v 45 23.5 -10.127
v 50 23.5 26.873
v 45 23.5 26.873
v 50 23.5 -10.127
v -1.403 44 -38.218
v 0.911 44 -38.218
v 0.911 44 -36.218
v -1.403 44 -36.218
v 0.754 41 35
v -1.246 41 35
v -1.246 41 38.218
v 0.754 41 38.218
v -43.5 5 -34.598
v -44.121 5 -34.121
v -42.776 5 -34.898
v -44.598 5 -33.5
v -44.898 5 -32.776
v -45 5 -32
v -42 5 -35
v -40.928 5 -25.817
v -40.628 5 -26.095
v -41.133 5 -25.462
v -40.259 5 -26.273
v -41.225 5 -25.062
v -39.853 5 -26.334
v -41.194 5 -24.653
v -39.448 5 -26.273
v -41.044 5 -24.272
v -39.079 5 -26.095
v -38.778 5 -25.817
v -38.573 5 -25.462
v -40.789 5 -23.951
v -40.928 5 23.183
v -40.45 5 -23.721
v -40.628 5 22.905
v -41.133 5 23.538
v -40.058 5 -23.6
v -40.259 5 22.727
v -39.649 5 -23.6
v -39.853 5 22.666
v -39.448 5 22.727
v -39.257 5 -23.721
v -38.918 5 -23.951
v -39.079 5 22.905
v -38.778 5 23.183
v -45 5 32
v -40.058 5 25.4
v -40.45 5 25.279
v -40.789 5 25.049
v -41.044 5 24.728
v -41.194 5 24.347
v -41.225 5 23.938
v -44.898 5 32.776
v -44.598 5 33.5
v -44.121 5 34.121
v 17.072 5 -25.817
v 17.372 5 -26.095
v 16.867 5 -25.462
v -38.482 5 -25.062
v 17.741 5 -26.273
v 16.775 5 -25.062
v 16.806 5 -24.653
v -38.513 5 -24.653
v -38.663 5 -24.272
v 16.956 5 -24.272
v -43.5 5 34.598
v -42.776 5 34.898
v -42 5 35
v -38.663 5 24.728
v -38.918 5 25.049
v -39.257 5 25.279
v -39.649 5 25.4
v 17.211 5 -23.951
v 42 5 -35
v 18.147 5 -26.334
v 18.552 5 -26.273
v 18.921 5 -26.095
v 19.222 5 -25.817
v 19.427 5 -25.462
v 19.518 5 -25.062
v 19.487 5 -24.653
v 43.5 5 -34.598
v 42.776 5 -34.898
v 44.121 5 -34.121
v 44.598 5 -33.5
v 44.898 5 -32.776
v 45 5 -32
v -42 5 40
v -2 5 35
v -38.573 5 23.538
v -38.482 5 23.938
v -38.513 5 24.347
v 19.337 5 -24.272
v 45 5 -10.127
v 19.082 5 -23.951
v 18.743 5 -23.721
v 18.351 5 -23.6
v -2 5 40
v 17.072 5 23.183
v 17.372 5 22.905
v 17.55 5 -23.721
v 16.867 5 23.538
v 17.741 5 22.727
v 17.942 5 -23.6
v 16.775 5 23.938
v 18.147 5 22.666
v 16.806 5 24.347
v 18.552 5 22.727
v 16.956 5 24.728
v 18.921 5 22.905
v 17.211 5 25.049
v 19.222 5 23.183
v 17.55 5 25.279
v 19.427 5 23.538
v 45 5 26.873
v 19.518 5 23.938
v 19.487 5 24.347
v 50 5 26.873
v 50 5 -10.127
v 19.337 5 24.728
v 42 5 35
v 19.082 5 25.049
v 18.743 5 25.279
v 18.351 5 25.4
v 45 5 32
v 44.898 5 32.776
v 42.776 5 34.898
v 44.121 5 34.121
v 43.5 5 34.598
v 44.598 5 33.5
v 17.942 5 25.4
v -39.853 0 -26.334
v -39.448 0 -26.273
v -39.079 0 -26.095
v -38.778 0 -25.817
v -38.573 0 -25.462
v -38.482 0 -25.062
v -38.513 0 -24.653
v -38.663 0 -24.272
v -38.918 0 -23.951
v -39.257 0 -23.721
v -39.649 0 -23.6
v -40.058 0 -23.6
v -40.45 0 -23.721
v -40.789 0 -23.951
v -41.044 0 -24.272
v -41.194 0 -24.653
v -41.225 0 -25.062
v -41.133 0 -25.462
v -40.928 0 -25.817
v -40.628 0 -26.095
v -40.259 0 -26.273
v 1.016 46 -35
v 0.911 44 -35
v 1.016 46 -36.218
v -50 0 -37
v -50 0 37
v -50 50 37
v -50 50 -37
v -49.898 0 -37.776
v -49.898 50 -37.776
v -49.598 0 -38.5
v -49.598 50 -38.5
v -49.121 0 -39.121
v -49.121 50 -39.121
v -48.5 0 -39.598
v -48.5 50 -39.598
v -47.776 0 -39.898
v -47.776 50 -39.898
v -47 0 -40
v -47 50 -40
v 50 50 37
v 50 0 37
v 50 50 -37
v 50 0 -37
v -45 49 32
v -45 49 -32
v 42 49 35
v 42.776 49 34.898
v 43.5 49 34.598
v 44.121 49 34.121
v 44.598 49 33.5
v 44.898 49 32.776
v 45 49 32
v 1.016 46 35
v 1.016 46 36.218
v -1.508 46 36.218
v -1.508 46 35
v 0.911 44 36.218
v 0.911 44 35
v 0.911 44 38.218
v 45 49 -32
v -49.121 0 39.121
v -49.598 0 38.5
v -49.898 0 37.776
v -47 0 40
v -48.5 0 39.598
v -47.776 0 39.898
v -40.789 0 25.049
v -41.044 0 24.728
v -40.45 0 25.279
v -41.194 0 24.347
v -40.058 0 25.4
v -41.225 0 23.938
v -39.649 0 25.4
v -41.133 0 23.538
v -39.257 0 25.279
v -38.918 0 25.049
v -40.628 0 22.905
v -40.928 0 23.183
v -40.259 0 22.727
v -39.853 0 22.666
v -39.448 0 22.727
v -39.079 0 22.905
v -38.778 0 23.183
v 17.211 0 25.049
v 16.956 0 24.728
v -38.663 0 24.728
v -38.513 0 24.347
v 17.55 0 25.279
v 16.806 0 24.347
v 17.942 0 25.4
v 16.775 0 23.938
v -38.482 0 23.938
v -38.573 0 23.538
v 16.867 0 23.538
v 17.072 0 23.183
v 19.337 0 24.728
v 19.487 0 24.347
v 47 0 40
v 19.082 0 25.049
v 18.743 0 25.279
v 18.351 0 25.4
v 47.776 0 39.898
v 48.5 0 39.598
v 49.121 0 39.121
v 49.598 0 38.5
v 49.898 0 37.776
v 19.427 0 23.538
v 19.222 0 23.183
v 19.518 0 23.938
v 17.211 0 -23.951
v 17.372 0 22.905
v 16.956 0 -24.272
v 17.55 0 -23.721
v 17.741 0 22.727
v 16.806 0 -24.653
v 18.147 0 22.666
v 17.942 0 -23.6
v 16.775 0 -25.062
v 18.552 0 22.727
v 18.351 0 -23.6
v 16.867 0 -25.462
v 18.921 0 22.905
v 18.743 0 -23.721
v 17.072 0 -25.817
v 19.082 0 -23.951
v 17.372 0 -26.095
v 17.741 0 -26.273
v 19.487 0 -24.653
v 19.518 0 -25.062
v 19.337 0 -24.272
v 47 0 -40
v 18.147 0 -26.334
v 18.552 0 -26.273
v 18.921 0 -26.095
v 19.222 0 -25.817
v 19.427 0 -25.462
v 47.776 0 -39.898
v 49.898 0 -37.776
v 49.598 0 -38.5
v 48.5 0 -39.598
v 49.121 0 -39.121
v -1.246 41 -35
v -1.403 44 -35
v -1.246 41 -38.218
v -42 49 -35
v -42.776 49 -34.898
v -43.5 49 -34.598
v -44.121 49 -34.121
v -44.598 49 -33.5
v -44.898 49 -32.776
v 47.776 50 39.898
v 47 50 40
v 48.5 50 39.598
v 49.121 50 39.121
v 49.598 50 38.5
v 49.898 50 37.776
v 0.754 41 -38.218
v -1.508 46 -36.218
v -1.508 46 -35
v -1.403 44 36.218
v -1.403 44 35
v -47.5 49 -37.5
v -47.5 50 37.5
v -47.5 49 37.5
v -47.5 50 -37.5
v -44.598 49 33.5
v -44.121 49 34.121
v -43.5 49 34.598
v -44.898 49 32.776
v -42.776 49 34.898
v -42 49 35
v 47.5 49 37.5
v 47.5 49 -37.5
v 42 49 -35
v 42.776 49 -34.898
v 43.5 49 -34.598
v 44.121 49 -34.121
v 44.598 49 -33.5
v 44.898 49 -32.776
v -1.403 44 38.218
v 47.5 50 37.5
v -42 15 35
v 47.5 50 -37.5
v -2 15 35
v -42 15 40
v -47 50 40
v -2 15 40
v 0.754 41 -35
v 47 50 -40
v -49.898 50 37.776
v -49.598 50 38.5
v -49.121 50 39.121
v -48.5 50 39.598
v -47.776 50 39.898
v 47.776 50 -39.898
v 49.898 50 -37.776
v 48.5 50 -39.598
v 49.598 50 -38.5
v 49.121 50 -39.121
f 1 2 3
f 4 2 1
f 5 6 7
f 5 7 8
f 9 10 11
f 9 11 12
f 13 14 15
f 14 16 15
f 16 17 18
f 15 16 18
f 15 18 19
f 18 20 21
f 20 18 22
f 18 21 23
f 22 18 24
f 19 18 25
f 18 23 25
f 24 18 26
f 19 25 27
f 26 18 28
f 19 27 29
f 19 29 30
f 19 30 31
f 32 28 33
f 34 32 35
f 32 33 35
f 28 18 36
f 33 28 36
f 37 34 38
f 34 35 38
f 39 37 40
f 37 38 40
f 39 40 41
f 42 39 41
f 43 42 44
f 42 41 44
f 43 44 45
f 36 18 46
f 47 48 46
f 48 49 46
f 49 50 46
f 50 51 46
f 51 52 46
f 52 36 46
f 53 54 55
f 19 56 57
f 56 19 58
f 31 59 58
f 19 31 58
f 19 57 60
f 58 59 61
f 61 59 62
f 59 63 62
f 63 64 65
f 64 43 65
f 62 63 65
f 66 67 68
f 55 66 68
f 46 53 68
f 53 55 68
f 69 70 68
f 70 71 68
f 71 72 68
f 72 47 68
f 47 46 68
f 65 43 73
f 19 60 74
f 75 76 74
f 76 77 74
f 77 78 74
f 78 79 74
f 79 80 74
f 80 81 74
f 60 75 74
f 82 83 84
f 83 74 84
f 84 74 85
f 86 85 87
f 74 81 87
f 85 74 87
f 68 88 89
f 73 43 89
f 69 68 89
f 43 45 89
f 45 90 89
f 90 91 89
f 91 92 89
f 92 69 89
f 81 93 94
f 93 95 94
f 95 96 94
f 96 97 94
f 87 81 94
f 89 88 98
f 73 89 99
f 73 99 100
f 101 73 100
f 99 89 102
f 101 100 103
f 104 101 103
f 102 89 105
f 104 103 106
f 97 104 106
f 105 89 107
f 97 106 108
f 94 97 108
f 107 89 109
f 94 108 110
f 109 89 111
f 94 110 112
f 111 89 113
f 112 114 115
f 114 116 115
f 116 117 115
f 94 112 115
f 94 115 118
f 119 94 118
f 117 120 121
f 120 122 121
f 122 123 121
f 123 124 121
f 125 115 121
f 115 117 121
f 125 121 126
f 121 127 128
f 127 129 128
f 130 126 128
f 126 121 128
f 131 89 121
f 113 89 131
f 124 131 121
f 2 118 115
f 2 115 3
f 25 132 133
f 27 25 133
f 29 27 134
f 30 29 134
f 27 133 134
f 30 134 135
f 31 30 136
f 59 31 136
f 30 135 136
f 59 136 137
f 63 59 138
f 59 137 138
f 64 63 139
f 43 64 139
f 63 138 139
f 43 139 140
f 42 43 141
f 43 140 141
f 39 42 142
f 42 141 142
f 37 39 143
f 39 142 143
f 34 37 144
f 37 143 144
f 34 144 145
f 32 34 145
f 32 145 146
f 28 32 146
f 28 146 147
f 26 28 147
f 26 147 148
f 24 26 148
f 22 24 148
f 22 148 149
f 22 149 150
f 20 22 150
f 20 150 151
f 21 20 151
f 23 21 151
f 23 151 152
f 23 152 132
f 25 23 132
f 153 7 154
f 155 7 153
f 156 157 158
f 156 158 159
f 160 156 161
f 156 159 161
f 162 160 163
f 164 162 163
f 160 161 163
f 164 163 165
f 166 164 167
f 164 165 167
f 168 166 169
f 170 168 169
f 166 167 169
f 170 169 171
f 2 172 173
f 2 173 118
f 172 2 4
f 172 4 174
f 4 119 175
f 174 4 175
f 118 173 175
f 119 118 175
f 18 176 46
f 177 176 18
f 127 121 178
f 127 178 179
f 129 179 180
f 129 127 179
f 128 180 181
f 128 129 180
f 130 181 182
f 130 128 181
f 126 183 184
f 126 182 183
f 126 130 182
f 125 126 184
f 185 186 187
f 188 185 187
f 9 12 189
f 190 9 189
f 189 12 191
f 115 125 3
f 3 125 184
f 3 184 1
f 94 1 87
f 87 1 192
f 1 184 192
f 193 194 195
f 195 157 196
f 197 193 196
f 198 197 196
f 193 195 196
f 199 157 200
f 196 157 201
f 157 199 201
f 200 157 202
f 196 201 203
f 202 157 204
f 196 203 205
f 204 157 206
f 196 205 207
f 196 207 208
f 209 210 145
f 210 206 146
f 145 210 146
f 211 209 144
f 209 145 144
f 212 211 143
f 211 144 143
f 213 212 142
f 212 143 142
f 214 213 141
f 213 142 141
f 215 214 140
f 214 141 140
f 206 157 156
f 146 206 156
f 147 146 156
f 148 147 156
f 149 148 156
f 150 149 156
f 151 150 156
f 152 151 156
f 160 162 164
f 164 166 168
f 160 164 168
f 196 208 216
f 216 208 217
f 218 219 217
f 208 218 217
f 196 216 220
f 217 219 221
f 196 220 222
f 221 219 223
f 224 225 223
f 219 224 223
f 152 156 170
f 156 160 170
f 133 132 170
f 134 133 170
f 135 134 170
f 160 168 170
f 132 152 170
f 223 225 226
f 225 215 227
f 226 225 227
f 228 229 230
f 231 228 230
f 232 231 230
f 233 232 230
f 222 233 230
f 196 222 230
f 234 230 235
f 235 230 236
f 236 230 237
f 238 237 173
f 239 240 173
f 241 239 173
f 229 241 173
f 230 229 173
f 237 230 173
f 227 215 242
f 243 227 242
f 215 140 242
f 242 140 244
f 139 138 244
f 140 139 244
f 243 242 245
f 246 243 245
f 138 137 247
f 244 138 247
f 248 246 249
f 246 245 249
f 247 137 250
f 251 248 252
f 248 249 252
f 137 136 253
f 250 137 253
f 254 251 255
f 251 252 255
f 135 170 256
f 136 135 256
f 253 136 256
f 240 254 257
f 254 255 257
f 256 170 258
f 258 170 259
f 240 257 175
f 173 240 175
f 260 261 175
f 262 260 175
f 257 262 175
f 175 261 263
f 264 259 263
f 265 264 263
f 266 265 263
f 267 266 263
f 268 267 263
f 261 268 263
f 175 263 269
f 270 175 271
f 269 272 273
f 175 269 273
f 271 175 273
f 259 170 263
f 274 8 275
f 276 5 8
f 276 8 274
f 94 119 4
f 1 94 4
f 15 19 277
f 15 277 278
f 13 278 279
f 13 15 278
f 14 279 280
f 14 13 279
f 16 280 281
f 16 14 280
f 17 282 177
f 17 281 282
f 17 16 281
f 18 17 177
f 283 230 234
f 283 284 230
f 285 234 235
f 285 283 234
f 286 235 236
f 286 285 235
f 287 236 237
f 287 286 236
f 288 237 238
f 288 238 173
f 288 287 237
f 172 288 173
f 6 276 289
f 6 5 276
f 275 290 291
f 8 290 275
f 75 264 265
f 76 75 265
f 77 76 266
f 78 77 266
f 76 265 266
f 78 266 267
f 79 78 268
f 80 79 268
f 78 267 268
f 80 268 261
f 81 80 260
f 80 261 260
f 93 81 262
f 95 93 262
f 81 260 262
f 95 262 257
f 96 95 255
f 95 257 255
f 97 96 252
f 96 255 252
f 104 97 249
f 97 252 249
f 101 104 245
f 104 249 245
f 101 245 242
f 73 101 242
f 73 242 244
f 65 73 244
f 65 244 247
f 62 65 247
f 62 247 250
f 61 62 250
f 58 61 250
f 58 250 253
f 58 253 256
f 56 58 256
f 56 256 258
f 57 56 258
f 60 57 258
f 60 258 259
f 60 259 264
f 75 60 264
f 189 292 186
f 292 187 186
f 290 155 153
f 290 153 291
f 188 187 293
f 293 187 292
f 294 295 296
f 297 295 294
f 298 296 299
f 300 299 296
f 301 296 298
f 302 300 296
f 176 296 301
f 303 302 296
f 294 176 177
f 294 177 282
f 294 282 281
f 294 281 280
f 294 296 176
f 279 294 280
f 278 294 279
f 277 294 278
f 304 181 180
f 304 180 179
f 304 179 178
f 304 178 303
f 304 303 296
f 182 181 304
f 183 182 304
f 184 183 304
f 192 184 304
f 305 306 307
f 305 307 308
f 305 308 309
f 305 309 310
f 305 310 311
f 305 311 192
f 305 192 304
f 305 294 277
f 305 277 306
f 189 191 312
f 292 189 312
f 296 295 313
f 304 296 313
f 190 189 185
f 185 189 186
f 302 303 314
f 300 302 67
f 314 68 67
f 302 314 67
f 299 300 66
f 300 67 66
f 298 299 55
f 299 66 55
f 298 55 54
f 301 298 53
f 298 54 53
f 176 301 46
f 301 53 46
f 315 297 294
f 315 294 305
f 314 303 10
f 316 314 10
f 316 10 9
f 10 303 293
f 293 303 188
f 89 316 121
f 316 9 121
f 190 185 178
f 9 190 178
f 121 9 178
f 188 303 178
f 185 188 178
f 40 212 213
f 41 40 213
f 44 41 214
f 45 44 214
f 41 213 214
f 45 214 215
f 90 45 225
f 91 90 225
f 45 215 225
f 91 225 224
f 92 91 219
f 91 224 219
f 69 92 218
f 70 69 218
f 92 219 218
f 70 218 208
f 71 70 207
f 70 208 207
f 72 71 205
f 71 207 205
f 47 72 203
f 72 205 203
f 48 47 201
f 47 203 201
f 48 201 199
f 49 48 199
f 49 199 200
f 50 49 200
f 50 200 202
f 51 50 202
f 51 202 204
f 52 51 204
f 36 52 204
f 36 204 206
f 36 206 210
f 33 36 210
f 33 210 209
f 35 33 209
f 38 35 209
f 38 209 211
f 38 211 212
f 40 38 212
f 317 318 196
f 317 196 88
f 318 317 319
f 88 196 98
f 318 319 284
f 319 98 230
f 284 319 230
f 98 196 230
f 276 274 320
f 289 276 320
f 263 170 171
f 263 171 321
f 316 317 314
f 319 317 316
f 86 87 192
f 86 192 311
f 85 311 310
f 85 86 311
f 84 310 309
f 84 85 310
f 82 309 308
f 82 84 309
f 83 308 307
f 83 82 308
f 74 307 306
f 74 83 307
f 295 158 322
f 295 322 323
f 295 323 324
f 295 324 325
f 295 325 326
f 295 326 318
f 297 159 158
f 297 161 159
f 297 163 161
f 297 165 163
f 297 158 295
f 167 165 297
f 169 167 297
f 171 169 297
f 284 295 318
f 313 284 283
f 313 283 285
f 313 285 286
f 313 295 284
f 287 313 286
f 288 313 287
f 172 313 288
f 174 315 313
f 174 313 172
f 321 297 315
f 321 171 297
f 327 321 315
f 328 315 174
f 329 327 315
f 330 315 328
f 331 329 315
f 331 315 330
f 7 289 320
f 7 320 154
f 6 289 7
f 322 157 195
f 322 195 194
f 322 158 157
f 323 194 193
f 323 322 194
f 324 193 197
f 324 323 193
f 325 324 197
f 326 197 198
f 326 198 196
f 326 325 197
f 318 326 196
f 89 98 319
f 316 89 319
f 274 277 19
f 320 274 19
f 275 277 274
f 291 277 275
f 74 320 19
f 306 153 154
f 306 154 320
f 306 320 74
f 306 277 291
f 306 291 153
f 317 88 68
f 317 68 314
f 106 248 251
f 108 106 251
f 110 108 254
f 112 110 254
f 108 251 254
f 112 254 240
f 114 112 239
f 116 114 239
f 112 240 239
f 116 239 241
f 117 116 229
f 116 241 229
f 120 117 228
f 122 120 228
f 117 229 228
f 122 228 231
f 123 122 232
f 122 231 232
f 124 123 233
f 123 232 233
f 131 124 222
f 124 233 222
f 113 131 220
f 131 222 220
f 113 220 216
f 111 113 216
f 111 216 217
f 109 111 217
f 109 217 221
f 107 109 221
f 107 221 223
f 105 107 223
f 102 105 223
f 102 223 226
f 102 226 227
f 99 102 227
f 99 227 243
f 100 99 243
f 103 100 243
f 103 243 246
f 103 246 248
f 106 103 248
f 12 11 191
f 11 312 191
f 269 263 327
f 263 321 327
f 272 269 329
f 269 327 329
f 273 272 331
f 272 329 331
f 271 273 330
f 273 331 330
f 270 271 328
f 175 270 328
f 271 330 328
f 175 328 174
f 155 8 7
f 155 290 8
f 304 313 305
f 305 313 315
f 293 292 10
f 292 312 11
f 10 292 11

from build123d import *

# Parameters (mm, degrees)
SKETCH2_W            = 100
SKETCH2_H            = 80
BOSS_EXTRUDE1_DEPTH  = 50
SKETCH3_W            = 90
SKETCH3_H            = 70
CUT_EXTRUDE1_DEPTH   = 45
FILLET2_R            = 3
SKETCH4_W            = 95
SKETCH4_H            = 75
CUT_EXTRUDE2_DEPTH   = 1
SKETCH5_W            = 40
SKETCH5_H            = 10
CUT_EXTRUDE3_DEPTH   = 10
SNAP_START           = -38.217722162
SNAP_GROOVE1_DEPTH   = 3.217722162
SNAP_START_2         = -36.217722162
SNAP_GROOVE1_2_DEPTH = 1.217722162
SKETCH8_R            = 1.375
CUT_EXTRUDE4_DEPTH   = 82.240384046
LPATTERN1_COUNT      = 2
LPATTERN1_PITCH      = 58
LPATTERN1_COUNT_DIR2 = 2
LPATTERN1_PITCH_DIR2 = 49
SKETCH9_W            = 37
SKETCH9_H            = 18.5
CUT_EXTRUDE6_DEPTH   = 10


# Read off the part's stored shape, not the designer's step: Snap Groove1
with BuildPart() as part:
    # Sketch2 → Boss-Extrude1 (new body)
    with BuildSketch(Plane(origin=(0, 0, 0), x_dir=(1, 0, 0), z_dir=(0, 1, 0))):
        Rectangle(SKETCH2_W, SKETCH2_H)
    extrude(amount=BOSS_EXTRUDE1_DEPTH)

    # Sketch3 → Cut-Extrude1 (cut)
    with BuildSketch(Plane(origin=(0, 50, 0), x_dir=(1, 0, 0), z_dir=(0, 1, 0))):
        Rectangle(SKETCH3_W, SKETCH3_H)
    extrude(amount=-CUT_EXTRUDE1_DEPTH, mode=Mode.SUBTRACT)

    # Fillet2
    fillet2_edges = [part.edges().sort_by_distance(p)[0] for p in [
        (45, 27.5, -35),
        (45, 27.5, 35),
        (-45, 27.5, 35),
        (-45, 27.5, -35),
        (50, 25, 40),
        (-50, 25, 40),
        (-50, 25, -40),
        (50, 25, -40),
    ]]
    fillet(fillet2_edges, radius=FILLET2_R)

    # Sketch4 → Cut-Extrude2 (cut)
    with BuildSketch(Plane(origin=(0, 50, 0), x_dir=(1, 0, 0), z_dir=(0, 1, 0))):
        Rectangle(SKETCH4_W, SKETCH4_H)
    extrude(amount=-CUT_EXTRUDE2_DEPTH, mode=Mode.SUBTRACT)

    # Sketch5 → Cut-Extrude3 (cut)
    with BuildSketch(Plane.XY.offset(40)):
        with Locations((-22, 10)):
            Rectangle(SKETCH5_W, SKETCH5_H)
    extrude(amount=-CUT_EXTRUDE3_DEPTH, mode=Mode.SUBTRACT)

    # Snap Groove1 outline → Snap Groove1 (cut)
    with BuildSketch(Plane.XY.offset(SNAP_START)):
        Polygon((-1.245807146, 41), (0.754192854, 41), (0.911416192, 44), (-1.403030484, 44), align=None)
    snap_groove1 = extrude(amount=SNAP_GROOVE1_DEPTH, mode=Mode.SUBTRACT)

    # Snap Groove1 2 outline → Snap Groove1 2 (cut)
    with BuildSketch(Plane.XY.offset(SNAP_START_2)):
        Polygon((-1.403030484, 44), (0.911416192, 44), (1.01623175, 46), (-1.507846042, 46), align=None)
    snap_groove1_2 = extrude(amount=SNAP_GROOVE1_2_DEPTH, mode=Mode.SUBTRACT)

    # Mirror1: Snap Groove1, Snap Groove1 2 across plane
    add(snap_groove1.mirror(Plane.XY), mode=Mode.SUBTRACT)
    add(snap_groove1_2.mirror(Plane.XY), mode=Mode.SUBTRACT)

    # Sketch8 → Cut-Extrude4 (cut, through all)
    with BuildSketch(Plane.XZ):
        with Locations(Location((18.146559745, 24.040628208, 0), (0, 0, 270))):
            Circle(SKETCH8_R)
    cut_extrude4 = extrude(amount=-CUT_EXTRUDE4_DEPTH, mode=Mode.SUBTRACT)

    # LPattern1: Cut-Extrude4 2 × 2
    with Locations(*[(-i * LPATTERN1_PITCH, 0, -j * LPATTERN1_PITCH_DIR2) for i in range(LPATTERN1_COUNT) for j in range(LPATTERN1_COUNT_DIR2) if (i, j) != (0, 0)]):
        add(cut_extrude4, mode=Mode.SUBTRACT)

    # Sketch9 → Cut-Extrude6 (cut)
    with BuildSketch(Plane(origin=(50, 0, 0), x_dir=(0, 0, -1), z_dir=(1, 0, 0))):
        with Locations((-8.373367198, 14.25)):
            Rectangle(SKETCH9_W, SKETCH9_H)
    extrude(amount=-CUT_EXTRUDE6_DEPTH, mode=Mode.SUBTRACT)


solid = part.part
